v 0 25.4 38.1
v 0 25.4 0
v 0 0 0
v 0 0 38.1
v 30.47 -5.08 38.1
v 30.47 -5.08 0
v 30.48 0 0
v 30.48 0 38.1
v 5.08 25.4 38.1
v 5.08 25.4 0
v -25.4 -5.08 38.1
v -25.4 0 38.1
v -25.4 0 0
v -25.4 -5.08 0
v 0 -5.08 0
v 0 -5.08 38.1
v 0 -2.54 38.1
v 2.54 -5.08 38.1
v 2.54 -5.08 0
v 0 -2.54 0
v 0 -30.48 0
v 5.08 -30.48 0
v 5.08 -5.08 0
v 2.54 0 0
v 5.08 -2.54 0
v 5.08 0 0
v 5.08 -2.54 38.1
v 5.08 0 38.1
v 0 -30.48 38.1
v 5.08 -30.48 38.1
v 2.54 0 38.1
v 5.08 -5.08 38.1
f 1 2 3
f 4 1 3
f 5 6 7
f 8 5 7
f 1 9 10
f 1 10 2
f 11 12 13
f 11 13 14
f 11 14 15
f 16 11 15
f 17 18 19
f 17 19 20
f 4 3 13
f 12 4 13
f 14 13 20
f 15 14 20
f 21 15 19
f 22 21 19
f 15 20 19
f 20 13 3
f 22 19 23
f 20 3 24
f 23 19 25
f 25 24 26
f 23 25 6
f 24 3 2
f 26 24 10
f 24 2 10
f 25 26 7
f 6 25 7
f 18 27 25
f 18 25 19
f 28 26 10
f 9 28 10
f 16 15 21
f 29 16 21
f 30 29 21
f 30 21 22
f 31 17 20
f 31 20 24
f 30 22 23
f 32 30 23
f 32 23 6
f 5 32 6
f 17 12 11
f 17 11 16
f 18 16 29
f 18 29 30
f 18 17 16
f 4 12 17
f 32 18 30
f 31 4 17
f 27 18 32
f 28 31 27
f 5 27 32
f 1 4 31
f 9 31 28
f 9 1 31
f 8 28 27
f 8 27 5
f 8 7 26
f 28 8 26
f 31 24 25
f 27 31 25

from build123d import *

# Parameters (mm, degrees)
F1_DEPTH = 38.1


with BuildPart() as f1:
    # F0 (on Top) → F1 (new body)
    with BuildSketch(Plane.XY):
        Polygon((0, 25.4), (0, 0), (-25.4, 0), (-25.4, -5.08), (0, -5.08), (0, -30.479991), (5.08, -30.479991), (5.08, -5.079991), (30.470396, -5.079991), (30.48, 0), (5.08, 0), (5.08, 25.4), align=None)
        Polygon((0, -2.54), (2.54, 0), (5.08, -2.539995), (2.54, -5.079995), align=None, mode=Mode.SUBTRACT)
    extrude(amount=F1_DEPTH)


solid = f1.part
